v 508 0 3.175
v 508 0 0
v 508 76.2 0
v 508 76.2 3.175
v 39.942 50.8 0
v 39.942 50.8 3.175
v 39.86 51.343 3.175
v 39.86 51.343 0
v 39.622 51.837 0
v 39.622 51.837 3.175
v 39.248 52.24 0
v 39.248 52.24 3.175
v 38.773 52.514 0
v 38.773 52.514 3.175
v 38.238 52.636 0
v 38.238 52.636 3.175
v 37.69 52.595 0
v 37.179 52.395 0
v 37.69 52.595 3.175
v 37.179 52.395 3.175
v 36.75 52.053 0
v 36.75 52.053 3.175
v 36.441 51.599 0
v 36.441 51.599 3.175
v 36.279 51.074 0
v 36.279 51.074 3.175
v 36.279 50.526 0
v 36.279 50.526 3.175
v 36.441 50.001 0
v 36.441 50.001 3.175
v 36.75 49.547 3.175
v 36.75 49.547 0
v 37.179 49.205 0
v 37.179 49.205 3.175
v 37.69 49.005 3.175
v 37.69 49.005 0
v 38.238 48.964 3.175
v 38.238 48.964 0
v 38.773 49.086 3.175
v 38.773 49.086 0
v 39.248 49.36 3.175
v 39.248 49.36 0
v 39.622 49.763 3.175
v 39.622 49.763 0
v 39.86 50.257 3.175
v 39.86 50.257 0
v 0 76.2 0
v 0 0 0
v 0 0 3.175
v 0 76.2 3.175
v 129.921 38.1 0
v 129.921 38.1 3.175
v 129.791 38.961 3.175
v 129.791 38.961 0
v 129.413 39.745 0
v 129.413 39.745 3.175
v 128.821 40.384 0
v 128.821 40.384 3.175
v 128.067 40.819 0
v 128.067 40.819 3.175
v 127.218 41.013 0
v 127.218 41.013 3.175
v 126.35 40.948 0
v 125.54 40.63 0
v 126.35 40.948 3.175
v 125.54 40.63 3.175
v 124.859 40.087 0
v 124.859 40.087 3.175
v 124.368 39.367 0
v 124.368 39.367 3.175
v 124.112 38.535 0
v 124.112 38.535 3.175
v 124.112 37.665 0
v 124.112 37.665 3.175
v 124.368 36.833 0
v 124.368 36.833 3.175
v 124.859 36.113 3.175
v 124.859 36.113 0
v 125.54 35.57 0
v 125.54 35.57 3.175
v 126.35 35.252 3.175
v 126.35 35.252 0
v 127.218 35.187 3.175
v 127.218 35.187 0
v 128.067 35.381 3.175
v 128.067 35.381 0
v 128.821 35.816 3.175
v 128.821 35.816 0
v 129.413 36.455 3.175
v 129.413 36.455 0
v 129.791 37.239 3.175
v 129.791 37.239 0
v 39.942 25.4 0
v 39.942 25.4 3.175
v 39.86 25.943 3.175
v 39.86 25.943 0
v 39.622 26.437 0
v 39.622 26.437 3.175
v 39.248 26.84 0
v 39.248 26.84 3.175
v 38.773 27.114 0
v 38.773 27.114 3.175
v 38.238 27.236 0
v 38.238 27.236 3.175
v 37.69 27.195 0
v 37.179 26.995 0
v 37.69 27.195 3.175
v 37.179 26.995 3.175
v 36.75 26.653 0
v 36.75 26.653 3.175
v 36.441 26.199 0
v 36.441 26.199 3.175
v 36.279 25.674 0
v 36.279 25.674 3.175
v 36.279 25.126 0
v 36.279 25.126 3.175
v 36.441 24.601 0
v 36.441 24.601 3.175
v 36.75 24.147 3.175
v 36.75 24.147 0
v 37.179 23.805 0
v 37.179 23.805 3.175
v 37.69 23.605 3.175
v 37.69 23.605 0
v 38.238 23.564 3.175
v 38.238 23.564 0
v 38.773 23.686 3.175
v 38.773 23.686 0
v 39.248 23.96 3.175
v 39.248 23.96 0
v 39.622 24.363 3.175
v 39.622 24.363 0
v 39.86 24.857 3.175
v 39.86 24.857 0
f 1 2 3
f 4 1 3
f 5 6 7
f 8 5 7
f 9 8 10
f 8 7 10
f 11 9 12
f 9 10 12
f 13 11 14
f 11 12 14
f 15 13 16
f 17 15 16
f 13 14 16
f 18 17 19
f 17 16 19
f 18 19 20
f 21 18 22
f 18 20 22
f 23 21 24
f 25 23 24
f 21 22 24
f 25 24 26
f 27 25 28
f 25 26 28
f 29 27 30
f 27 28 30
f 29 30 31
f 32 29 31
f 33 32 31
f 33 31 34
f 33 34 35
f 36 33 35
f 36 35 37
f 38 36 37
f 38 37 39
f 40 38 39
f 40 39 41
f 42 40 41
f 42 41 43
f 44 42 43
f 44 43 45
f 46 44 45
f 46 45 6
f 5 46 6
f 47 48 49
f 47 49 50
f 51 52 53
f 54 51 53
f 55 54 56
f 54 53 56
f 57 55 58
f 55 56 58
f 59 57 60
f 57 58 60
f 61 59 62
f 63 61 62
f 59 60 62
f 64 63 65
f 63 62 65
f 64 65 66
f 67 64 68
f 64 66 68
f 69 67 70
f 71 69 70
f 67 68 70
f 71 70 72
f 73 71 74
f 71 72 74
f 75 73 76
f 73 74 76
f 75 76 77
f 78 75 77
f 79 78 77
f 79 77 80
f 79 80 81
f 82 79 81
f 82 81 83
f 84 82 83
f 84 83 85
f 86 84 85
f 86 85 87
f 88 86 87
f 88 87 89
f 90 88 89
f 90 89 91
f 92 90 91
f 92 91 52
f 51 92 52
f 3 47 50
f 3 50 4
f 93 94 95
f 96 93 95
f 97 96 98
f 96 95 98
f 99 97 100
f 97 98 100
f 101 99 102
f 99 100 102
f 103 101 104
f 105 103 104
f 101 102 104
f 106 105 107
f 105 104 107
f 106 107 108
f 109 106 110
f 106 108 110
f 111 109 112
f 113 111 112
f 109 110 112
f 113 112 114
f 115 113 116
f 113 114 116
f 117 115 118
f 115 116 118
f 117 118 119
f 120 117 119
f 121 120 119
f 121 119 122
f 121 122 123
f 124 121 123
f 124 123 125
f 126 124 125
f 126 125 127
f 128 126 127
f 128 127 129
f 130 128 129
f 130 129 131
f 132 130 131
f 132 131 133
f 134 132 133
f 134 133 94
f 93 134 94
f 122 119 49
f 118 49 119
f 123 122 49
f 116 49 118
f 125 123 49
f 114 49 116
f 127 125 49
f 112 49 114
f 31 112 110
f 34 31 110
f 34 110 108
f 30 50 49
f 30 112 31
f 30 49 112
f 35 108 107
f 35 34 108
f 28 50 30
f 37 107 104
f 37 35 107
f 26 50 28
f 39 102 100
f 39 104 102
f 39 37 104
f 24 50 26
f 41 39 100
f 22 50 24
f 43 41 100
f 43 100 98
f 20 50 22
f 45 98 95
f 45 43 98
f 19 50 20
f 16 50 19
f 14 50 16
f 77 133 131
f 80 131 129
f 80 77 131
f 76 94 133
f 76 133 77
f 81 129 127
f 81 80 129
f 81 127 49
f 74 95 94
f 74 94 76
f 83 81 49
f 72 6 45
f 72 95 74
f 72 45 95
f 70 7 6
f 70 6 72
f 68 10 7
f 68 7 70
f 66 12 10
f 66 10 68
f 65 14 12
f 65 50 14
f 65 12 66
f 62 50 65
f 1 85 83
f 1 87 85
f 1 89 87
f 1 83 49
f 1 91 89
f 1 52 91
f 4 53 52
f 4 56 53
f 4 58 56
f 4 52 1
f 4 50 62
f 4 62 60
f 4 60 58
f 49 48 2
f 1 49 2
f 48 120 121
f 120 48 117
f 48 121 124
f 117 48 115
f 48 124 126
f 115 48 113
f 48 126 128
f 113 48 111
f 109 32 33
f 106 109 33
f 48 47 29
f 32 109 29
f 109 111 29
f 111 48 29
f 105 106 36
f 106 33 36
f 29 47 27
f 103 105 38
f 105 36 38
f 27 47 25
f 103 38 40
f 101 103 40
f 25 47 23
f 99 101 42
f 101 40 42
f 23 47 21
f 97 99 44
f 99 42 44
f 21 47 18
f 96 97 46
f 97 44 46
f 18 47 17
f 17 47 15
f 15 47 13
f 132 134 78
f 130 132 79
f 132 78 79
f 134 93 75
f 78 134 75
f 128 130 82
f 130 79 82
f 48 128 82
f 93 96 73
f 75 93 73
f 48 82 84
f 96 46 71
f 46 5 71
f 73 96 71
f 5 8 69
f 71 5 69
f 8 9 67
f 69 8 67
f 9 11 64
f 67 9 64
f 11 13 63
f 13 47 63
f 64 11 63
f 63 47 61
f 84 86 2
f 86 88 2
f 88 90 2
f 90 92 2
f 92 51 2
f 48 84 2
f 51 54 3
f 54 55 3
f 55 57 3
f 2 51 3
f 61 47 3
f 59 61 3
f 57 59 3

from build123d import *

# Parameters (mm, degrees)
SKETCH1_W            = 508
SKETCH1_H            = 76.2
BASIC_PLANK_DEPTH    = 3.175
SKETCH3_R            = 1.8415
CUT_EXTRUDE4_DEPTH   = 4.175
SKETCH4_R            = 2.921
THROUGH_TRIPOD_DEPTH = 4.175


with BuildPart() as part:
    # Sketch1 → basic_plank (new body)
    with BuildSketch(Plane.XY):
        with Locations((254, 38.1)):
            Rectangle(SKETCH1_W, SKETCH1_H)
    extrude(amount=BASIC_PLANK_DEPTH)

    # Sketch3 → Cut-Extrude4 (cut, through all)
    with BuildSketch(Plane.XY.offset(3.175)):
        with Locations((38.1, 50.8)):
            Circle(SKETCH3_R)
        with Locations((38.1, 25.4)):
            Circle(SKETCH3_R)
    extrude(amount=-CUT_EXTRUDE4_DEPTH, mode=Mode.SUBTRACT)

    # Sketch4 → through_tripod (cut, through all)
    with BuildSketch(Plane.XY.offset(3.175)):
        with Locations((127, 38.1)):
            Circle(SKETCH4_R)
    extrude(amount=-THROUGH_TRIPOD_DEPTH, mode=Mode.SUBTRACT)


solid = part.part
